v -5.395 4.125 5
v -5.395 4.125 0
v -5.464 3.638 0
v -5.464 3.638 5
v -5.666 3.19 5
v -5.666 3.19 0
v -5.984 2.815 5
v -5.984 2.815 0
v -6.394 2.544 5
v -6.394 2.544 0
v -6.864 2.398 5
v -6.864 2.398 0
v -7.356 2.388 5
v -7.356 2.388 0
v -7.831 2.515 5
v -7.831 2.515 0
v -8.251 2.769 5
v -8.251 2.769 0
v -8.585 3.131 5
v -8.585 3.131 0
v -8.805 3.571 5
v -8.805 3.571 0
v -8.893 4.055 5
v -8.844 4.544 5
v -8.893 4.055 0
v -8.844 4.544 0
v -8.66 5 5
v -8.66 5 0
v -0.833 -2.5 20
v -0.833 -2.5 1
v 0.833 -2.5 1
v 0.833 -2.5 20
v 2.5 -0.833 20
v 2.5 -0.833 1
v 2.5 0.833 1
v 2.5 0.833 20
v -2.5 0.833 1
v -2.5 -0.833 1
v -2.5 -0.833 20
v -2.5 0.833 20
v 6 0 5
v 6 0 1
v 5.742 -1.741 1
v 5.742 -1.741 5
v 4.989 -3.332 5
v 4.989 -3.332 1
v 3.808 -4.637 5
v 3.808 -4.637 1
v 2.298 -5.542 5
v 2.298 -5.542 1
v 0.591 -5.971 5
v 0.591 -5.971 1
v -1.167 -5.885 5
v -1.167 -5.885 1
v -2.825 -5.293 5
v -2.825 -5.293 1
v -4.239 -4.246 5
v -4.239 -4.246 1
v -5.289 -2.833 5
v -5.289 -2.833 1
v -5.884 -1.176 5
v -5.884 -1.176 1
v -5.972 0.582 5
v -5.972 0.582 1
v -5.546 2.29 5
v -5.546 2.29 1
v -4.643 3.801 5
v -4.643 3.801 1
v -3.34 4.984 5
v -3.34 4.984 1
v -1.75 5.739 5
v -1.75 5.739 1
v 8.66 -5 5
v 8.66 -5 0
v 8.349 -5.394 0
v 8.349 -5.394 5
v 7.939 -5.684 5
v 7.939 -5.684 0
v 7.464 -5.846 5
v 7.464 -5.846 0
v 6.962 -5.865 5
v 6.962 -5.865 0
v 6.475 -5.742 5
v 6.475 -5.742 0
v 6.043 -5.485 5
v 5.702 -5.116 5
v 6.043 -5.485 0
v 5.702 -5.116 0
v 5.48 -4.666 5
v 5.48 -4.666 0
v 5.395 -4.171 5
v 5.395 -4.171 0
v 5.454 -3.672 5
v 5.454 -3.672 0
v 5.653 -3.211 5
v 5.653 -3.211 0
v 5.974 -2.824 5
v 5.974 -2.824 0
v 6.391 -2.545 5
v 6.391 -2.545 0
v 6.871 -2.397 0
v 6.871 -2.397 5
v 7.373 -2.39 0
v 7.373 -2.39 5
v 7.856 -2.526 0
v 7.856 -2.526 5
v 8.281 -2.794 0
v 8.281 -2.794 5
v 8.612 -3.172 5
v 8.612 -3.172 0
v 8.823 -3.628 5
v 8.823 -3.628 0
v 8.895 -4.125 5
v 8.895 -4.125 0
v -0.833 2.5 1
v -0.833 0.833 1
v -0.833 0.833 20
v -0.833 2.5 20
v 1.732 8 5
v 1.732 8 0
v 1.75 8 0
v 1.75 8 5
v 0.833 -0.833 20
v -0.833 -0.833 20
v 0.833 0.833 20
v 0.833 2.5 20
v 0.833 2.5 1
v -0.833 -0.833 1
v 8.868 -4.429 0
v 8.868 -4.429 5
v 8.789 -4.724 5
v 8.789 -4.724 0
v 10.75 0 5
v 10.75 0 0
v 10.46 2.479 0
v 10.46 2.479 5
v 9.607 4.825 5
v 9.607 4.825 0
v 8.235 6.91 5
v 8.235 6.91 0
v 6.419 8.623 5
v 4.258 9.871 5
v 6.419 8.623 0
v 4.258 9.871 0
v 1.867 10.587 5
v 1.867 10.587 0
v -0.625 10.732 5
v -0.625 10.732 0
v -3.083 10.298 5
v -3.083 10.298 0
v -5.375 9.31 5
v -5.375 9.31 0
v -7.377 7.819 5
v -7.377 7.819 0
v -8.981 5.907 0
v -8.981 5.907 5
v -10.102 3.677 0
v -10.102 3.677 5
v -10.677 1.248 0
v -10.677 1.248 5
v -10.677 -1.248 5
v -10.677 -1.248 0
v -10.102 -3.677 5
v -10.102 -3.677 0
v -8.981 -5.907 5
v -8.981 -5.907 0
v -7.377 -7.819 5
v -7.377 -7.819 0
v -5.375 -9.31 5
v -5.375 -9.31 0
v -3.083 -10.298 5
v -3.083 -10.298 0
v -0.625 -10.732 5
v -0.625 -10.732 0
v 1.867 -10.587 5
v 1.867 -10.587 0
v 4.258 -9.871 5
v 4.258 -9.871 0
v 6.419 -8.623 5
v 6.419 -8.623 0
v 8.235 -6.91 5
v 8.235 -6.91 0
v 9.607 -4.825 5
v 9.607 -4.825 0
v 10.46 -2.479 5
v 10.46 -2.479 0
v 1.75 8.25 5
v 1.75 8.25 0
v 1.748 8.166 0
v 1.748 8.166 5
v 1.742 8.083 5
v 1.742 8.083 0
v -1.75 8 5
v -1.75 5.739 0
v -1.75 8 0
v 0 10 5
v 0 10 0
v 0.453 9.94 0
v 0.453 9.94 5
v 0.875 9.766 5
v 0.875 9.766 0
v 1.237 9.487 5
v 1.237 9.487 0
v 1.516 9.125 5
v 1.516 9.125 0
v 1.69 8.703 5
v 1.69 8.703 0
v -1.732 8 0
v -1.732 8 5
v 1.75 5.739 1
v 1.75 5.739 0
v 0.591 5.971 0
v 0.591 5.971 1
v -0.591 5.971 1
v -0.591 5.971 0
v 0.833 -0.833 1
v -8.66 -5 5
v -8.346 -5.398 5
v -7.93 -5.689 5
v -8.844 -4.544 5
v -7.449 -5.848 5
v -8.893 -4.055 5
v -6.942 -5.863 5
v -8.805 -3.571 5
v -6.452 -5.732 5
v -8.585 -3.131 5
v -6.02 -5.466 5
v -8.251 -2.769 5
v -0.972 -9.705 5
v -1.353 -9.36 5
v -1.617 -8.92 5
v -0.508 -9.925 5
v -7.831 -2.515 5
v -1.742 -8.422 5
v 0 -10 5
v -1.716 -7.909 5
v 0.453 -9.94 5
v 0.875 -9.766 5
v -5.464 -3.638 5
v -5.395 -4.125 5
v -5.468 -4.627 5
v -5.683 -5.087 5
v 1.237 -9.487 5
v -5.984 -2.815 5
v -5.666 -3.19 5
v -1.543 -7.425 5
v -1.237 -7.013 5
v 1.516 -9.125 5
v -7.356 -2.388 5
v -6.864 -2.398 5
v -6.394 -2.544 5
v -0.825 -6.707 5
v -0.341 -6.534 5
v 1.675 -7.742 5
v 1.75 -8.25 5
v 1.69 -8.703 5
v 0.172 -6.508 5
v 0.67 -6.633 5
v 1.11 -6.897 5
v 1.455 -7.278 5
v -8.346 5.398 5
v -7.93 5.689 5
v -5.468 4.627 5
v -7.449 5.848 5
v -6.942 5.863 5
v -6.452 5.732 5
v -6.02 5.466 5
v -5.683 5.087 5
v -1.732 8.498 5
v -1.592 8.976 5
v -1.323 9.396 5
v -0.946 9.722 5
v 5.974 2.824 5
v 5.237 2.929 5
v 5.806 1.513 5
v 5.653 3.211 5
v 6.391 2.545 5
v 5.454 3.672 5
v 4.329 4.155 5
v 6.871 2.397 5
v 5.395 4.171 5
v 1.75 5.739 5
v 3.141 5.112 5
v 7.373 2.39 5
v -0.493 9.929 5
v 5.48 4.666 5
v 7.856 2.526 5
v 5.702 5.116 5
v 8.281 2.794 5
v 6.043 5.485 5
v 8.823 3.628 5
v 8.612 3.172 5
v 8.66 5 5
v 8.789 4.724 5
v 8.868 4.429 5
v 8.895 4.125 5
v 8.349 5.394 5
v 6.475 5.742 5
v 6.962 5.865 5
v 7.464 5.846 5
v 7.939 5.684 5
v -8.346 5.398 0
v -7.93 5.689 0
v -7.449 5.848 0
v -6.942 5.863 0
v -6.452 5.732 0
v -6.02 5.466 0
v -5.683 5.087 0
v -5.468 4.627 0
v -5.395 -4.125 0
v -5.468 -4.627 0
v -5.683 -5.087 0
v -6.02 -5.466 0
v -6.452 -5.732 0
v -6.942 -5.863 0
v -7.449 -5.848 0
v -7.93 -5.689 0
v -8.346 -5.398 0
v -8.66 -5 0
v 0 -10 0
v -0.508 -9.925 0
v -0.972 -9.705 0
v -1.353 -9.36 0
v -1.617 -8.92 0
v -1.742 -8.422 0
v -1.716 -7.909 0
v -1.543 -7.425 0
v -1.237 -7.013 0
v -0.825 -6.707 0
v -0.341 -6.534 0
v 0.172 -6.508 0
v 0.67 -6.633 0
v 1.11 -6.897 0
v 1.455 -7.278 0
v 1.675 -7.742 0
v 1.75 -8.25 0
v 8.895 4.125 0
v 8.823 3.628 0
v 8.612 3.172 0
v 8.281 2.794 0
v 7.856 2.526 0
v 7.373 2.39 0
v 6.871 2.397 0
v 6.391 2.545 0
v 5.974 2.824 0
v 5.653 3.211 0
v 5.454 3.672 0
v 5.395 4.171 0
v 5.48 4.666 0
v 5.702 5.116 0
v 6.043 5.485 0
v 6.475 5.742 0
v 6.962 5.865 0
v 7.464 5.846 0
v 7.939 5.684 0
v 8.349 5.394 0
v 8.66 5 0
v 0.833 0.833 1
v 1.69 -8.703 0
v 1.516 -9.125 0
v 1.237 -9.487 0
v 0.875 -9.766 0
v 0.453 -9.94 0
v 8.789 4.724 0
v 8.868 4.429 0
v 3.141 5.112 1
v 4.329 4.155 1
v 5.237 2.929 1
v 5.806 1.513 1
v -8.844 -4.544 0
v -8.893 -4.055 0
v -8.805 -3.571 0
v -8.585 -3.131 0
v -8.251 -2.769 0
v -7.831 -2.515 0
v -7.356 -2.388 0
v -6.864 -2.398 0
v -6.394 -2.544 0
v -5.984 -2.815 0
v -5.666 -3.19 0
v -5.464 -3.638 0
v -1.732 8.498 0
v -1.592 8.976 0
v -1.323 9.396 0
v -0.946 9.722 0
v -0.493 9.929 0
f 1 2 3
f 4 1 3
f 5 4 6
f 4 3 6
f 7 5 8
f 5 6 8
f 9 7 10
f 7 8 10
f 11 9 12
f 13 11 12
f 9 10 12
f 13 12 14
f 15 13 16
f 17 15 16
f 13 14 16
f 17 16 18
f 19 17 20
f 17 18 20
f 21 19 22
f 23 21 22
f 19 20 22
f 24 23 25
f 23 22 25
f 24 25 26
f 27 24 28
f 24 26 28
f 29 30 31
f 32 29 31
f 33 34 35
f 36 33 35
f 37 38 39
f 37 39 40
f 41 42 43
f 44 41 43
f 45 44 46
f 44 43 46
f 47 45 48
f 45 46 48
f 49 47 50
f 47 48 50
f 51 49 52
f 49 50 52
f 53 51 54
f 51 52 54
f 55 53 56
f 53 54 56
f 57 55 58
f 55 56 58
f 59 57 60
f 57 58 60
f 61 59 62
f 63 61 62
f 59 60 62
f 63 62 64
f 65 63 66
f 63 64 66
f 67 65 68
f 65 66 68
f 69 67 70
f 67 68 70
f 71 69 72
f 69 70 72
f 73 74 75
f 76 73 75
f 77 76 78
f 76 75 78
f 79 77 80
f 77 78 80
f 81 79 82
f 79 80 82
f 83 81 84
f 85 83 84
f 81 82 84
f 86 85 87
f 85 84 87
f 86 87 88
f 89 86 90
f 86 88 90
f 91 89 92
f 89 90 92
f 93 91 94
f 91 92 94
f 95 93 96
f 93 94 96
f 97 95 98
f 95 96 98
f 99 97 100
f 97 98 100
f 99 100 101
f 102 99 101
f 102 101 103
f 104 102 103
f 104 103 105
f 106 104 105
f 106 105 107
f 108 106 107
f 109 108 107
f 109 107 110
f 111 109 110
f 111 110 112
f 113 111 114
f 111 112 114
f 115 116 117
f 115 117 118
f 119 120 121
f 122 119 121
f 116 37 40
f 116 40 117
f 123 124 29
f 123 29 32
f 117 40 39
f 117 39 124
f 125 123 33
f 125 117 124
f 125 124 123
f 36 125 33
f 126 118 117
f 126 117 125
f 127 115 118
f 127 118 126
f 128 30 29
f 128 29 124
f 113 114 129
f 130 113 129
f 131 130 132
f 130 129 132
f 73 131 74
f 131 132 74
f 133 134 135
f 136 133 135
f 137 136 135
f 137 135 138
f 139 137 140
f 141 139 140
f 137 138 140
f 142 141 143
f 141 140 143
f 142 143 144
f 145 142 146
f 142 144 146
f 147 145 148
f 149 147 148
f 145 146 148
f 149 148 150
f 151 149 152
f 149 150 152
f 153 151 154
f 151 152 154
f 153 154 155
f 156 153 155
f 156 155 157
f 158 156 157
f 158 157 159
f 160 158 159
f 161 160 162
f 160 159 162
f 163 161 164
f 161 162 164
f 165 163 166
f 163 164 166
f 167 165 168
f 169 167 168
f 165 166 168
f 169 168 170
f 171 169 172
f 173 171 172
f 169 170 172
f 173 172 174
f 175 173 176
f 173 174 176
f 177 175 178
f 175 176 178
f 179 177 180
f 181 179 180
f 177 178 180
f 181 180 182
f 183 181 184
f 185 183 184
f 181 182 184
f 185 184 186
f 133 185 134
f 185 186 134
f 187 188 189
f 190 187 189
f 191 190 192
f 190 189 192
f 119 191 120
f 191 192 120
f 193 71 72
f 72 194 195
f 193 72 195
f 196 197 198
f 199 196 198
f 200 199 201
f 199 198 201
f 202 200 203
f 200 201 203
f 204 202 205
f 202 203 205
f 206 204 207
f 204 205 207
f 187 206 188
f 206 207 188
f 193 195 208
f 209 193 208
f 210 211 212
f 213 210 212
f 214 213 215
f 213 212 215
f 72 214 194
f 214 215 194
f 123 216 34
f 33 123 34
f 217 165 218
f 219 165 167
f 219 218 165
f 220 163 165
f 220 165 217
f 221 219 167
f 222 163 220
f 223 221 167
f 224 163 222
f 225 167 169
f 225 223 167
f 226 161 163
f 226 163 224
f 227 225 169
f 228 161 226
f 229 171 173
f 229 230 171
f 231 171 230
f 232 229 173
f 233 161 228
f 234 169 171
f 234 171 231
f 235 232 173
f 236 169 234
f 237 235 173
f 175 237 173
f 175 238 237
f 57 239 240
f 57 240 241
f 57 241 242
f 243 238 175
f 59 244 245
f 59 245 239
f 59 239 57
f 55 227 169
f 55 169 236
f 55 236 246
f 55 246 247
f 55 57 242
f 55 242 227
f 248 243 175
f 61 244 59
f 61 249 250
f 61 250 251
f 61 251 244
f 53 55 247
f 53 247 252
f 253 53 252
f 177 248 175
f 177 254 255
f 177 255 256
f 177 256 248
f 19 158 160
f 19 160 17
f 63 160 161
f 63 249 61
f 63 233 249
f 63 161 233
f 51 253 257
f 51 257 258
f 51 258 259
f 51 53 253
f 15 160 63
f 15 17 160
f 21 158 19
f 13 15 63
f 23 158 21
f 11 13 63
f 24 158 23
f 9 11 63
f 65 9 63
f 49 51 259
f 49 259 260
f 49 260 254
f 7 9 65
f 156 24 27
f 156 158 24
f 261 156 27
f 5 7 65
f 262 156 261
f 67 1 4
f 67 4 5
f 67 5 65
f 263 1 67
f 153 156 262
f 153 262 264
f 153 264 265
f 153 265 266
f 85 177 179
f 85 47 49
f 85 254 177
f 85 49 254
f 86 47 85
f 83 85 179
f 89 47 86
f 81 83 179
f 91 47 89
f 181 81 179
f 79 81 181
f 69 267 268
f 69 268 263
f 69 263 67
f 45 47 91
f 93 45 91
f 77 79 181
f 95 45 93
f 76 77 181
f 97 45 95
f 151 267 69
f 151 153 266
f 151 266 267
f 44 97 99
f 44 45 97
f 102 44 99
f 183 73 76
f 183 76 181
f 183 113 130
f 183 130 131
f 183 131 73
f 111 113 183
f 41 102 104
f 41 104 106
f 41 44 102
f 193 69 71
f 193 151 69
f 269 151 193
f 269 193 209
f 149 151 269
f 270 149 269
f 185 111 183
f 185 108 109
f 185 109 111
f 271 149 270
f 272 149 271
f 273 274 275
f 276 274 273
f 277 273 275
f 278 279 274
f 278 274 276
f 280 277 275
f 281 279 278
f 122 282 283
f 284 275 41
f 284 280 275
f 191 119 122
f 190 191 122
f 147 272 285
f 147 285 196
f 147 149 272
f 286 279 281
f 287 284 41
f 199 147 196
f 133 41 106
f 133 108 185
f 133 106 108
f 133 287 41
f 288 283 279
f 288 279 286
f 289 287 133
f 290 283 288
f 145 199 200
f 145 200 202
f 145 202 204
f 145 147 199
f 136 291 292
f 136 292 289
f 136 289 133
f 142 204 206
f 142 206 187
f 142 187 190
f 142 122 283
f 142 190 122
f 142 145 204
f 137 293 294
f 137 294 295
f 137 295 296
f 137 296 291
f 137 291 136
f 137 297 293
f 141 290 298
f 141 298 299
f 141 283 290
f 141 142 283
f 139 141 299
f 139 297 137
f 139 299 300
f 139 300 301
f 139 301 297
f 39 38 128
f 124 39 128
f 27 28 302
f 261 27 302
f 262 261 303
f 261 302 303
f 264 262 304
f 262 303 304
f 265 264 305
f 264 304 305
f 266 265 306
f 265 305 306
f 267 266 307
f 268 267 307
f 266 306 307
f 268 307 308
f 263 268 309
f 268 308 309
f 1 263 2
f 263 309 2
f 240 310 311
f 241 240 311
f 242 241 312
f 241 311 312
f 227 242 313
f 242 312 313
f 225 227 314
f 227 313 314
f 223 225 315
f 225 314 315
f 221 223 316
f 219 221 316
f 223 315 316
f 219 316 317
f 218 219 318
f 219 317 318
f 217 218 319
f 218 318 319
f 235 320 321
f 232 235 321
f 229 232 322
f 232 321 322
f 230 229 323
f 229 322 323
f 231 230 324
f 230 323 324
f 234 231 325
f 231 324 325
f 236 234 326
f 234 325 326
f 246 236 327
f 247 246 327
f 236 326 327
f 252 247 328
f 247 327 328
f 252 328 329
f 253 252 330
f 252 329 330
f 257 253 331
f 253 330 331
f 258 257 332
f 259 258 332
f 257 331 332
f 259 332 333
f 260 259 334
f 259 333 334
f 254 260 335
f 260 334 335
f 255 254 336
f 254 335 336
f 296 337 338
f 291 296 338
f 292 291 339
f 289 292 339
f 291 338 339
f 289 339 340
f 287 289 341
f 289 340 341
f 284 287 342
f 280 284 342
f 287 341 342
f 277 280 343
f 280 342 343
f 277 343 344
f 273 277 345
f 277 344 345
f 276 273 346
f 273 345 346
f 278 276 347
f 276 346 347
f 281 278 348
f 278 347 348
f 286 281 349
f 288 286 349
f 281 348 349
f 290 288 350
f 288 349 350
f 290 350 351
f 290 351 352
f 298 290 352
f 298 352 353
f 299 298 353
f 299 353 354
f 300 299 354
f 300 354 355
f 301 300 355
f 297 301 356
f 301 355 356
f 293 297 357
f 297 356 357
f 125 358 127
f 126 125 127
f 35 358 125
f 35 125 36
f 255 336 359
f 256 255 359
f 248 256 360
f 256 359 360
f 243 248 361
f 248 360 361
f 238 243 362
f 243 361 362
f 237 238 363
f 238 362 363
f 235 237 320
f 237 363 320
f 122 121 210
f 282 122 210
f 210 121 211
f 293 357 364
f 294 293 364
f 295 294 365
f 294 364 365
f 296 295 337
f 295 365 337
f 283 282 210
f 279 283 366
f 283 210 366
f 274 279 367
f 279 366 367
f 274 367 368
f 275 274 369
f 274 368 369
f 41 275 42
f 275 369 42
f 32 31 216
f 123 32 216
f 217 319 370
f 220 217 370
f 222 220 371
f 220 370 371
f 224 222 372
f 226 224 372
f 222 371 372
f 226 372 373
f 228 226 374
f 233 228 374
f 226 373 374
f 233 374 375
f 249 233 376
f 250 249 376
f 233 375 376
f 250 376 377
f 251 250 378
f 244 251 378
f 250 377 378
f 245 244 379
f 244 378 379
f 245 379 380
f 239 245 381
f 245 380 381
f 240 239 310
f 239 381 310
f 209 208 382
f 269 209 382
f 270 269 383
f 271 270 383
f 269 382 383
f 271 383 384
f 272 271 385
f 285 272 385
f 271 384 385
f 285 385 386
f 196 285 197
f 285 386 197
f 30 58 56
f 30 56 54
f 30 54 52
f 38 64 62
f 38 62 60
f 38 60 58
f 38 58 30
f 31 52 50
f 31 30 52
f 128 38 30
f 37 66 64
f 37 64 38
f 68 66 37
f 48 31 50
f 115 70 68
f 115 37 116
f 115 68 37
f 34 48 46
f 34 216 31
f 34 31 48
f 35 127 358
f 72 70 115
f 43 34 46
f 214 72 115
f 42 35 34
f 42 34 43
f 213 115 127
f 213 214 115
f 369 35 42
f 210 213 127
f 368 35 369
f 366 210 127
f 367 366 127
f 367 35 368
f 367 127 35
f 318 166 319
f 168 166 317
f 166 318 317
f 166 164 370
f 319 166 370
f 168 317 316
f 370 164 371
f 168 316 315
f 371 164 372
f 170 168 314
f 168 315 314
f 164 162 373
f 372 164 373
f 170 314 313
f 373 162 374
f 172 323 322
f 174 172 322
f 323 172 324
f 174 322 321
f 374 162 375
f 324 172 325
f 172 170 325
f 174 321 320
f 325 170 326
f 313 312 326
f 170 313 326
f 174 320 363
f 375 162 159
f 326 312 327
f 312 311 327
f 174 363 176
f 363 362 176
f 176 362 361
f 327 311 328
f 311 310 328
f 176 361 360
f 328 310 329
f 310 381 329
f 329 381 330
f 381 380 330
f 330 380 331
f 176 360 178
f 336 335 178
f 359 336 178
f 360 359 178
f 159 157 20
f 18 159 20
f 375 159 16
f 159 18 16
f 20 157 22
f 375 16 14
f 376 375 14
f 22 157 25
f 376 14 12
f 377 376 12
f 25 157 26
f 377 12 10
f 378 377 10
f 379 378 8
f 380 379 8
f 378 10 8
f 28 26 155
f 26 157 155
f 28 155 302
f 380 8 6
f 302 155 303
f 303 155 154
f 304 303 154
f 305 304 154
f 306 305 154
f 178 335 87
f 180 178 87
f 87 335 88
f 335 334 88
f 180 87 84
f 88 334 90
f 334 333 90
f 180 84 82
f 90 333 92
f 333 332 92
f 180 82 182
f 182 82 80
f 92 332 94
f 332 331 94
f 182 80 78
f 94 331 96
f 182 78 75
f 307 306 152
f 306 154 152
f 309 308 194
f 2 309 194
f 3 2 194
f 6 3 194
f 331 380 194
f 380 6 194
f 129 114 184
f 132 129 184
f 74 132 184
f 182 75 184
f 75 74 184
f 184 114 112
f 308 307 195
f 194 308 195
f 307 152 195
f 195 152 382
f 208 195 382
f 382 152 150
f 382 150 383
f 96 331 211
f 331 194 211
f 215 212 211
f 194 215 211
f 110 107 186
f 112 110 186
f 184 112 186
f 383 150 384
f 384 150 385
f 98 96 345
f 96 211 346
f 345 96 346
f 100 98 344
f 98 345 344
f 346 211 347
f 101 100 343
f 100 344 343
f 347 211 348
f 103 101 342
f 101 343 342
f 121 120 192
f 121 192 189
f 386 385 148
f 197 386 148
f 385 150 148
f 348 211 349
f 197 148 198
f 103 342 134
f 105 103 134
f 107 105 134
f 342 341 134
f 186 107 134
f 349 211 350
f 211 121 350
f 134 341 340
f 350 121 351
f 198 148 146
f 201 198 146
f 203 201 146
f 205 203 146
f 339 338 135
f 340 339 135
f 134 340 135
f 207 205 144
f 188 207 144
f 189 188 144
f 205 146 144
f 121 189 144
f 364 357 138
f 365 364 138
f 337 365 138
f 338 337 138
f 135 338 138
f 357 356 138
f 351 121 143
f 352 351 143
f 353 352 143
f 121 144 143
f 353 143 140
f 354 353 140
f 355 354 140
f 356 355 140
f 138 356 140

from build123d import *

# Parameters (mm, degrees)
F0_W     = 1.6666666667
F0_H     = 1.6666666667
F2_DEPTH = 20
F1_R     = 10.75
F3_DEPTH = 5
F4_DEPTH = 1


with BuildPart() as f2:
    # F0 (on Top) → F2 (new body)
    with BuildSketch(Plane.XY):
        with Locations((0, 1.6666666667)):
            Rectangle(F0_W, F0_H)
        with Locations((-1.6666666667, 0)):
            Rectangle(F0_W, F0_H)
        with Locations((0, -1.6666666667)):
            Rectangle(F0_W, F0_H)
        Rectangle(F0_W, F0_H)
        with Locations((1.6666666667, 0)):
            Rectangle(F0_W, F0_H)
    extrude(amount=F2_DEPTH)



with BuildPart() as f3:
    # F1 (on Top) → F3 (new body)
    with BuildSketch(Plane.XY):
        Circle(F1_R)
        with BuildLine():
            ThreePointArc((-8.6602540538, 4.9999999724), (-5.0000000138, 8.6602540299), (0, 10))
            ThreePointArc((0, 10), (5.0000000138, 8.6602540299), (8.6602540538, 4.9999999724))
            ThreePointArc((8.6602540538, 4.9999999724), (9.659258267, 2.5881904356), (10, 0))
            ThreePointArc((10, 0), (9.6592582663, -2.5881904384), (8.6602540509, -4.9999999774))
            ThreePointArc((8.6602540509, -4.9999999774), (5.0000000086, -8.6602540329), (-6.2e-09, -10))
            ThreePointArc((-6.2e-09, -10), (-5.0000000165, -8.6602540283), (-8.6602540538, -4.9999999724))
            ThreePointArc((-8.6602540538, -4.9999999724), (-10, 0), (-8.6602540538, 4.9999999724))
        make_face(mode=Mode.SUBTRACT)
        with BuildLine():
            ThreePointArc((8.6602540538, 4.9999999724), (5.0000000138, 8.6602540299), (0, 10))
            ThreePointArc((0, 10), (-5.0000000138, 8.6602540299), (-8.6602540538, 4.9999999724))
            ThreePointArc((-8.6602540538, 4.9999999724), (-10, 0), (-8.6602540538, -4.9999999724))
            ThreePointArc((-8.6602540538, -4.9999999724), (-5.0000000165, -8.6602540283), (-6.2e-09, -10))
            ThreePointArc((-6.2e-09, -10), (5.0000000086, -8.6602540329), (8.6602540509, -4.9999999774))
            ThreePointArc((8.6602540509, -4.9999999774), (9.6592582663, -2.5881904384), (10, 0))
            ThreePointArc((10, 0), (9.659258267, 2.5881904356), (8.6602540538, 4.9999999724))
        make_face()
        with BuildLine():
            ThreePointArc((-5.3947095812, -4.125), (-6.6917762677, -5.8153702001), (-8.6602540538, -4.9999999724))
            ThreePointArc((-8.6602540538, -4.9999999724), (-7.5976428947, -2.4346297999), (-5.3947095812, -4.125))
        make_face(mode=Mode.SUBTRACT)
        with BuildLine():
            ThreePointArc((1.75, -8.25), (1.2374368649, -9.4874368693), (-6.2e-09, -10))
            ThreePointArc((-6.2e-09, -10), (-1.2374368649, -7.0125631307), (1.75, -8.25))
        make_face(mode=Mode.SUBTRACT)
        with BuildLine():
            ThreePointArc((8.8947095812, -4.125), (8.8350797806, -4.5779333163), (8.6602540509, -4.9999999774))
            ThreePointArc((8.6602540509, -4.9999999774), (5.4543393818, -3.6720666837), (8.8947095812, -4.125))
        make_face(mode=Mode.SUBTRACT)
        with BuildLine():
            ThreePointArc((-5.3947095812, 4.125), (-7.5976428947, 2.4346297999), (-8.6602540538, 4.9999999724))
            ThreePointArc((-8.6602540538, 4.9999999724), (-6.6917762677, 5.8153702001), (-5.3947095812, 4.125))
        make_face(mode=Mode.SUBTRACT)
        with BuildLine():
            ThreePointArc((1.75, 5.7391201416), (4.8218253805, 3.5707142143), (6, 0))
            ThreePointArc((6, 0), (-3.5707142143, -4.8218253805), (-1.75, 5.7391201416))
            Line((-1.75, 5.7391201416), (-1.75, 8))
            Line((-1.75, 8), (-1.7320508076, 8))
            ThreePointArc((-1.7320508076, 8), (-1.3228756555, 9.3956439237), (0, 10))
            ThreePointArc((0, 10), (1.2374368671, 9.4874368671), (1.75, 8.25))
            ThreePointArc((1.75, 8.25), (1.745506934, 8.1246782406), (1.7320508076, 8))
            Line((1.7320508076, 8), (1.75, 8))
            Line((1.75, 8), (1.75, 5.7391201416))
        make_face(mode=Mode.SUBTRACT)
        with BuildLine():
            ThreePointArc((8.8947095812, 4.125), (5.4543393811, 3.6720666865), (8.6602540538, 4.9999999724))
            ThreePointArc((8.6602540538, 4.9999999724), (8.8350797814, 4.5779333135), (8.8947095812, 4.125))
        make_face(mode=Mode.SUBTRACT)
    extrude(amount=F3_DEPTH)


with BuildPart() as f2_1:
    add(f2.part)

    add(f3.part)  # F4 merges F3
    # F1 (on Top) → F4 (join)
    with BuildSketch(Plane.XY):
        with BuildLine():
            ThreePointArc((-1.75, 5.7391201416), (-3.5707142143, -4.8218253805), (6, 0))
            ThreePointArc((6, 0), (4.8218253805, 3.5707142143), (1.75, 5.7391201416))
            ThreePointArc((1.75, 5.7391201416), (0, 6), (-1.75, 5.7391201416))
        make_face()
    extrude(amount=F4_DEPTH)


solid = f2_1.part
